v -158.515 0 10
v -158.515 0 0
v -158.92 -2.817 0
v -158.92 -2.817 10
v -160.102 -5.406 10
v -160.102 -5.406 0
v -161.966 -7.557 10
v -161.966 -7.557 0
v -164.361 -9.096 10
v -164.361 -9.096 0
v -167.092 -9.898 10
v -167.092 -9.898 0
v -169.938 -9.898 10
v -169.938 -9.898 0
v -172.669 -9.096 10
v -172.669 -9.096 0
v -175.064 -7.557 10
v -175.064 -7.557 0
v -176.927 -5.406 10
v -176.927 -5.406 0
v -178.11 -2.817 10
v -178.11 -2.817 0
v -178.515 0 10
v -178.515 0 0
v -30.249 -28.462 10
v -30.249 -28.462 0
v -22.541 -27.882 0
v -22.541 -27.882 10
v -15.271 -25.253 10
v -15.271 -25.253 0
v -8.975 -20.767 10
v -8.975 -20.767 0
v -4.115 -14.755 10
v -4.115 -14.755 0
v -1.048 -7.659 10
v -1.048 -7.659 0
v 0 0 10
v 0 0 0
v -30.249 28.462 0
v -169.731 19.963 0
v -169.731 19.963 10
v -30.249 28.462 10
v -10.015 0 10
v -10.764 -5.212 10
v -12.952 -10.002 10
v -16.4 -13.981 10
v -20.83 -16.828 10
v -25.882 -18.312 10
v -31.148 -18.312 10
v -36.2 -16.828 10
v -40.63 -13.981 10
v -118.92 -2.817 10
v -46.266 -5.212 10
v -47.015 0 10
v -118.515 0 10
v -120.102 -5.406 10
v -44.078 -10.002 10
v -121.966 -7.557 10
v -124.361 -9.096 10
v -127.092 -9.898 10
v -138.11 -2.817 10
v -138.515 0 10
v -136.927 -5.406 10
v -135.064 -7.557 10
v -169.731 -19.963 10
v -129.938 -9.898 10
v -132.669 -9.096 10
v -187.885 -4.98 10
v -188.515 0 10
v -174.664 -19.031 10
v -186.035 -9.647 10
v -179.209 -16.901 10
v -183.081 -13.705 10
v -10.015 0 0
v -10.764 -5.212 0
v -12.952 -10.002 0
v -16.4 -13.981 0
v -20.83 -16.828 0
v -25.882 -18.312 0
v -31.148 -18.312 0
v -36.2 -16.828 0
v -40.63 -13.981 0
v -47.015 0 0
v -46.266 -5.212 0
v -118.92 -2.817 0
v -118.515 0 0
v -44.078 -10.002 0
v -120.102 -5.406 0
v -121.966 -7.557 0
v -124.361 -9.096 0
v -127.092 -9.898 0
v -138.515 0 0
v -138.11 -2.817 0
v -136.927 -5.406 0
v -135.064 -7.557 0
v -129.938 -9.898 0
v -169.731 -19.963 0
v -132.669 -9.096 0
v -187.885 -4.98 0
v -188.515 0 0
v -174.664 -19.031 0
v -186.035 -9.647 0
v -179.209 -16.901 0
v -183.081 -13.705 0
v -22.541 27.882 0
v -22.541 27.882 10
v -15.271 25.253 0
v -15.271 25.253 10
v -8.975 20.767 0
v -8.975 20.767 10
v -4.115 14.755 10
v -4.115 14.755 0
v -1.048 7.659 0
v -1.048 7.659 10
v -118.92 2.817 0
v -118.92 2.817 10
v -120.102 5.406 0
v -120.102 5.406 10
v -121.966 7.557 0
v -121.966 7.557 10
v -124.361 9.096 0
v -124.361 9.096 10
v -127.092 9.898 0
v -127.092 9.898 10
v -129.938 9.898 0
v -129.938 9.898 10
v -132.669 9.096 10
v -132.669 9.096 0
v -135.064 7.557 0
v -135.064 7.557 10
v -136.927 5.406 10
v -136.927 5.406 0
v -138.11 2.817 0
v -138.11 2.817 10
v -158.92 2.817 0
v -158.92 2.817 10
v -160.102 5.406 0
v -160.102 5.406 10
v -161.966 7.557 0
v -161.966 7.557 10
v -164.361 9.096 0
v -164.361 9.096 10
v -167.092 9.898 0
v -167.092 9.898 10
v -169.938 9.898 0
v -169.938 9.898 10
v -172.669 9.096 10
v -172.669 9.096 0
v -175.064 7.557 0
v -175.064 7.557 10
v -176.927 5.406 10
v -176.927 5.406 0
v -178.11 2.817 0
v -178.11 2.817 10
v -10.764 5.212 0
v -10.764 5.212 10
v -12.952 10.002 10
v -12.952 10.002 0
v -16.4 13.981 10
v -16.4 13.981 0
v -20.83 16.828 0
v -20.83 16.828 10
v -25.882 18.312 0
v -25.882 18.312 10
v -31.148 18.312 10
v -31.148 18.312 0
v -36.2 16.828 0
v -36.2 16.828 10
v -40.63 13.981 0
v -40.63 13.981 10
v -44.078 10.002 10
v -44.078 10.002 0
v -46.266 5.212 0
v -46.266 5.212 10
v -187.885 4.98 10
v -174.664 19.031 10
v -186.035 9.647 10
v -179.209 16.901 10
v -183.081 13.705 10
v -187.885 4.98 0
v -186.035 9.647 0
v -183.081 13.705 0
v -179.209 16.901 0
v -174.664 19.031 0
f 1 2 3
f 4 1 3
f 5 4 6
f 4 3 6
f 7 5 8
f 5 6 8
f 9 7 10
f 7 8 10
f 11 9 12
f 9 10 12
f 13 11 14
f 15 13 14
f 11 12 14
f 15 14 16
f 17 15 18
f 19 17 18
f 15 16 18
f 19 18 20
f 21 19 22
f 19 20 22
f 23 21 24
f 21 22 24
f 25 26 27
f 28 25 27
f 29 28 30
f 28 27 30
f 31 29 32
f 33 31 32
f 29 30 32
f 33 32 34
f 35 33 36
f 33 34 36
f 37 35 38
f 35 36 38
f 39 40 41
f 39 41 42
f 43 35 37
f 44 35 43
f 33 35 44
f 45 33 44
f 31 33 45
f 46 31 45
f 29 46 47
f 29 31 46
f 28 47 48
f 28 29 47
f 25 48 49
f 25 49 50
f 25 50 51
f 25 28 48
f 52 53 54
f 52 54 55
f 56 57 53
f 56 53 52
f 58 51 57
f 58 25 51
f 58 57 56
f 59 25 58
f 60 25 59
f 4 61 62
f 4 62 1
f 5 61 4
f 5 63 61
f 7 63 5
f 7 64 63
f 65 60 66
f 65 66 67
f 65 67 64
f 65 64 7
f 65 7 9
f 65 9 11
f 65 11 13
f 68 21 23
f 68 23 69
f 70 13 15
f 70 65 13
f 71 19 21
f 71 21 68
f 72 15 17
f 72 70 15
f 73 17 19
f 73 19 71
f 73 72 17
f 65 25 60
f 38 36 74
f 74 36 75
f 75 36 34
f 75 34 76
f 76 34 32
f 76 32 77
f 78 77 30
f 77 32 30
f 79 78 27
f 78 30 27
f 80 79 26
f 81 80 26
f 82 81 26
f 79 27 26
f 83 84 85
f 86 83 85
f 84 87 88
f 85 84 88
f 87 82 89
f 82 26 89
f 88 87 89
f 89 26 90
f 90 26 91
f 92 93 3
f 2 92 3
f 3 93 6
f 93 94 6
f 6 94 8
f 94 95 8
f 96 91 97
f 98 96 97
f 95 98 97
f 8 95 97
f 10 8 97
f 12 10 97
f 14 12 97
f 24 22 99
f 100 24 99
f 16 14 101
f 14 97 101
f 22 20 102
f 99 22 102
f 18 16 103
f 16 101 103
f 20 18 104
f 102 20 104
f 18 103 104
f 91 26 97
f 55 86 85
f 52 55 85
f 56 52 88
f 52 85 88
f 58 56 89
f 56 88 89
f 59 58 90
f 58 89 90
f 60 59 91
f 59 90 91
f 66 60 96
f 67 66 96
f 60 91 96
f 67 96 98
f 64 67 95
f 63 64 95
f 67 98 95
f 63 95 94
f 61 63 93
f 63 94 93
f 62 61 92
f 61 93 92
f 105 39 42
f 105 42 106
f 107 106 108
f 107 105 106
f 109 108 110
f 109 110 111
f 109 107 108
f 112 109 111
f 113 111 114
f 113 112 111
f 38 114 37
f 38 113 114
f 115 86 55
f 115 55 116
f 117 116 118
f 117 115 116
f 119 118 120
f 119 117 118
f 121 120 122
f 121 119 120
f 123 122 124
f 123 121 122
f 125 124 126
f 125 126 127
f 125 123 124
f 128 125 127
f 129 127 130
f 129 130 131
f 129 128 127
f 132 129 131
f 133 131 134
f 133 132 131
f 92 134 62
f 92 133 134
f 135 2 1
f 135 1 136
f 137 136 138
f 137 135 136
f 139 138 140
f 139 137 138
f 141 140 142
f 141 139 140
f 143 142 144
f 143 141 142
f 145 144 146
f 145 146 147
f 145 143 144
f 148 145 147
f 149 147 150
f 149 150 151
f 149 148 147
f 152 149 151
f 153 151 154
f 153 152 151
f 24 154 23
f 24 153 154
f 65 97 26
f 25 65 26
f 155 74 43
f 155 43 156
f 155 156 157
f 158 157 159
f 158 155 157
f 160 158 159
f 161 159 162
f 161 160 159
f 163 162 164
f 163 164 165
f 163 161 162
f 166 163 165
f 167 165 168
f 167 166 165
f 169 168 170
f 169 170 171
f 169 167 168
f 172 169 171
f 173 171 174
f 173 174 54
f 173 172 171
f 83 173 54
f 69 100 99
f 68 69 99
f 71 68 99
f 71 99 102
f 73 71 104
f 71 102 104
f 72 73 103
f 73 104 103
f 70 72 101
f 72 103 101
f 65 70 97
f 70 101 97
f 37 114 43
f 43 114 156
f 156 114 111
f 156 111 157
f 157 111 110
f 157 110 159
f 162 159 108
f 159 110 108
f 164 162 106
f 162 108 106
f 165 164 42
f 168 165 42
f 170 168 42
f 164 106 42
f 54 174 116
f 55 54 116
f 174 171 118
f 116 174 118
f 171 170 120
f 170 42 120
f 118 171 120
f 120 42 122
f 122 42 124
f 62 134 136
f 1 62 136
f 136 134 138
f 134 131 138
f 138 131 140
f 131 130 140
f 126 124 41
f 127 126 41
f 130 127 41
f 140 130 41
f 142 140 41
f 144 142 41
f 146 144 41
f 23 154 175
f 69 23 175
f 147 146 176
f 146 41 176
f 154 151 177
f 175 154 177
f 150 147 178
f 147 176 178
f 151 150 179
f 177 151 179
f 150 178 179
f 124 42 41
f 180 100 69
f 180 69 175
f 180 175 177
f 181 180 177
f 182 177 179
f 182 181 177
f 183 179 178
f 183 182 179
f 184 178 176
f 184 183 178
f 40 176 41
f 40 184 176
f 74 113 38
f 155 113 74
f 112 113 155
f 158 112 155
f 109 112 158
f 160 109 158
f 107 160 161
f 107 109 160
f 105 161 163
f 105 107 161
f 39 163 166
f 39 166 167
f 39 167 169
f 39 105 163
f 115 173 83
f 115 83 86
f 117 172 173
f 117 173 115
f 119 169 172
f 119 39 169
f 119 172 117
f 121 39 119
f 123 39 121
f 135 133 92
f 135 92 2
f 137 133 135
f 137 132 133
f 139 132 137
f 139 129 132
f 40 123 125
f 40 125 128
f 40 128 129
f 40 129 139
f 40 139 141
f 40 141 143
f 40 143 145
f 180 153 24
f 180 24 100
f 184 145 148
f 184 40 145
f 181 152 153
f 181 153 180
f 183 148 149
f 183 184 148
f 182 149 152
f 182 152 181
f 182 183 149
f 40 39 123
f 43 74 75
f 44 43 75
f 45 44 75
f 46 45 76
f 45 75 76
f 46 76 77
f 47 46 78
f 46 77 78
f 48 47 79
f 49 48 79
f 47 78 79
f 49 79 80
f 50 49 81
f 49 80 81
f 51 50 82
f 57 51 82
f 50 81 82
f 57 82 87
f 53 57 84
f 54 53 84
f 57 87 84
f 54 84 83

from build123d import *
from build123d.topology import SkipClean

# Parameters (mm, degrees)
BOSS_EXTRUDE1_DEPTH = 10


with BuildPart() as part:
    # Sketch1 → Boss-Extrude1 (new body)
    with BuildSketch(Plane(origin=(0, 0, 0), x_dir=(-1, 0, 0), z_dir=(0, 0, 1))):
        with BuildLine():
            Line((0, 0), (10.014962741, 0))
            ThreePointArc((10.014962741, 0), (28.514962741, 18.5), (47.014962741, 0))
            Line((47.014962741, 0), (118.514962741, 0))
            ThreePointArc((118.514962741, 0), (128.514962741, 10), (138.514962741, 0))
            Line((138.514962741, 0), (158.514962741, 0))
            ThreePointArc((158.514962741, 0), (168.514962741, 10), (178.514962741, 0))
            Line((178.514962741, 0), (188.514962741, 0))
            ThreePointArc((188.514962741, 0), (183.080821195, 13.70531895), (169.73138599, 19.962973588))
            Line((169.73138599, 19.962973588), (30.249275922, 28.462172403))
            ThreePointArc((30.249275922, 28.462172403), (8.974629781, 20.767245555), (0, 0))
        make_face()
    boss_extrude1 = extrude(amount=BOSS_EXTRUDE1_DEPTH)

    # Mirror1: Boss-Extrude1 across plane
    with SkipClean():  # the faces are left unmerged after this step: merging them gives an invalid solid
        add(boss_extrude1.mirror(Plane(origin=(-47.014962741, 0, 10), x_dir=(0, 0, 1), z_dir=(0, -1, 0))))


solid = part.part
